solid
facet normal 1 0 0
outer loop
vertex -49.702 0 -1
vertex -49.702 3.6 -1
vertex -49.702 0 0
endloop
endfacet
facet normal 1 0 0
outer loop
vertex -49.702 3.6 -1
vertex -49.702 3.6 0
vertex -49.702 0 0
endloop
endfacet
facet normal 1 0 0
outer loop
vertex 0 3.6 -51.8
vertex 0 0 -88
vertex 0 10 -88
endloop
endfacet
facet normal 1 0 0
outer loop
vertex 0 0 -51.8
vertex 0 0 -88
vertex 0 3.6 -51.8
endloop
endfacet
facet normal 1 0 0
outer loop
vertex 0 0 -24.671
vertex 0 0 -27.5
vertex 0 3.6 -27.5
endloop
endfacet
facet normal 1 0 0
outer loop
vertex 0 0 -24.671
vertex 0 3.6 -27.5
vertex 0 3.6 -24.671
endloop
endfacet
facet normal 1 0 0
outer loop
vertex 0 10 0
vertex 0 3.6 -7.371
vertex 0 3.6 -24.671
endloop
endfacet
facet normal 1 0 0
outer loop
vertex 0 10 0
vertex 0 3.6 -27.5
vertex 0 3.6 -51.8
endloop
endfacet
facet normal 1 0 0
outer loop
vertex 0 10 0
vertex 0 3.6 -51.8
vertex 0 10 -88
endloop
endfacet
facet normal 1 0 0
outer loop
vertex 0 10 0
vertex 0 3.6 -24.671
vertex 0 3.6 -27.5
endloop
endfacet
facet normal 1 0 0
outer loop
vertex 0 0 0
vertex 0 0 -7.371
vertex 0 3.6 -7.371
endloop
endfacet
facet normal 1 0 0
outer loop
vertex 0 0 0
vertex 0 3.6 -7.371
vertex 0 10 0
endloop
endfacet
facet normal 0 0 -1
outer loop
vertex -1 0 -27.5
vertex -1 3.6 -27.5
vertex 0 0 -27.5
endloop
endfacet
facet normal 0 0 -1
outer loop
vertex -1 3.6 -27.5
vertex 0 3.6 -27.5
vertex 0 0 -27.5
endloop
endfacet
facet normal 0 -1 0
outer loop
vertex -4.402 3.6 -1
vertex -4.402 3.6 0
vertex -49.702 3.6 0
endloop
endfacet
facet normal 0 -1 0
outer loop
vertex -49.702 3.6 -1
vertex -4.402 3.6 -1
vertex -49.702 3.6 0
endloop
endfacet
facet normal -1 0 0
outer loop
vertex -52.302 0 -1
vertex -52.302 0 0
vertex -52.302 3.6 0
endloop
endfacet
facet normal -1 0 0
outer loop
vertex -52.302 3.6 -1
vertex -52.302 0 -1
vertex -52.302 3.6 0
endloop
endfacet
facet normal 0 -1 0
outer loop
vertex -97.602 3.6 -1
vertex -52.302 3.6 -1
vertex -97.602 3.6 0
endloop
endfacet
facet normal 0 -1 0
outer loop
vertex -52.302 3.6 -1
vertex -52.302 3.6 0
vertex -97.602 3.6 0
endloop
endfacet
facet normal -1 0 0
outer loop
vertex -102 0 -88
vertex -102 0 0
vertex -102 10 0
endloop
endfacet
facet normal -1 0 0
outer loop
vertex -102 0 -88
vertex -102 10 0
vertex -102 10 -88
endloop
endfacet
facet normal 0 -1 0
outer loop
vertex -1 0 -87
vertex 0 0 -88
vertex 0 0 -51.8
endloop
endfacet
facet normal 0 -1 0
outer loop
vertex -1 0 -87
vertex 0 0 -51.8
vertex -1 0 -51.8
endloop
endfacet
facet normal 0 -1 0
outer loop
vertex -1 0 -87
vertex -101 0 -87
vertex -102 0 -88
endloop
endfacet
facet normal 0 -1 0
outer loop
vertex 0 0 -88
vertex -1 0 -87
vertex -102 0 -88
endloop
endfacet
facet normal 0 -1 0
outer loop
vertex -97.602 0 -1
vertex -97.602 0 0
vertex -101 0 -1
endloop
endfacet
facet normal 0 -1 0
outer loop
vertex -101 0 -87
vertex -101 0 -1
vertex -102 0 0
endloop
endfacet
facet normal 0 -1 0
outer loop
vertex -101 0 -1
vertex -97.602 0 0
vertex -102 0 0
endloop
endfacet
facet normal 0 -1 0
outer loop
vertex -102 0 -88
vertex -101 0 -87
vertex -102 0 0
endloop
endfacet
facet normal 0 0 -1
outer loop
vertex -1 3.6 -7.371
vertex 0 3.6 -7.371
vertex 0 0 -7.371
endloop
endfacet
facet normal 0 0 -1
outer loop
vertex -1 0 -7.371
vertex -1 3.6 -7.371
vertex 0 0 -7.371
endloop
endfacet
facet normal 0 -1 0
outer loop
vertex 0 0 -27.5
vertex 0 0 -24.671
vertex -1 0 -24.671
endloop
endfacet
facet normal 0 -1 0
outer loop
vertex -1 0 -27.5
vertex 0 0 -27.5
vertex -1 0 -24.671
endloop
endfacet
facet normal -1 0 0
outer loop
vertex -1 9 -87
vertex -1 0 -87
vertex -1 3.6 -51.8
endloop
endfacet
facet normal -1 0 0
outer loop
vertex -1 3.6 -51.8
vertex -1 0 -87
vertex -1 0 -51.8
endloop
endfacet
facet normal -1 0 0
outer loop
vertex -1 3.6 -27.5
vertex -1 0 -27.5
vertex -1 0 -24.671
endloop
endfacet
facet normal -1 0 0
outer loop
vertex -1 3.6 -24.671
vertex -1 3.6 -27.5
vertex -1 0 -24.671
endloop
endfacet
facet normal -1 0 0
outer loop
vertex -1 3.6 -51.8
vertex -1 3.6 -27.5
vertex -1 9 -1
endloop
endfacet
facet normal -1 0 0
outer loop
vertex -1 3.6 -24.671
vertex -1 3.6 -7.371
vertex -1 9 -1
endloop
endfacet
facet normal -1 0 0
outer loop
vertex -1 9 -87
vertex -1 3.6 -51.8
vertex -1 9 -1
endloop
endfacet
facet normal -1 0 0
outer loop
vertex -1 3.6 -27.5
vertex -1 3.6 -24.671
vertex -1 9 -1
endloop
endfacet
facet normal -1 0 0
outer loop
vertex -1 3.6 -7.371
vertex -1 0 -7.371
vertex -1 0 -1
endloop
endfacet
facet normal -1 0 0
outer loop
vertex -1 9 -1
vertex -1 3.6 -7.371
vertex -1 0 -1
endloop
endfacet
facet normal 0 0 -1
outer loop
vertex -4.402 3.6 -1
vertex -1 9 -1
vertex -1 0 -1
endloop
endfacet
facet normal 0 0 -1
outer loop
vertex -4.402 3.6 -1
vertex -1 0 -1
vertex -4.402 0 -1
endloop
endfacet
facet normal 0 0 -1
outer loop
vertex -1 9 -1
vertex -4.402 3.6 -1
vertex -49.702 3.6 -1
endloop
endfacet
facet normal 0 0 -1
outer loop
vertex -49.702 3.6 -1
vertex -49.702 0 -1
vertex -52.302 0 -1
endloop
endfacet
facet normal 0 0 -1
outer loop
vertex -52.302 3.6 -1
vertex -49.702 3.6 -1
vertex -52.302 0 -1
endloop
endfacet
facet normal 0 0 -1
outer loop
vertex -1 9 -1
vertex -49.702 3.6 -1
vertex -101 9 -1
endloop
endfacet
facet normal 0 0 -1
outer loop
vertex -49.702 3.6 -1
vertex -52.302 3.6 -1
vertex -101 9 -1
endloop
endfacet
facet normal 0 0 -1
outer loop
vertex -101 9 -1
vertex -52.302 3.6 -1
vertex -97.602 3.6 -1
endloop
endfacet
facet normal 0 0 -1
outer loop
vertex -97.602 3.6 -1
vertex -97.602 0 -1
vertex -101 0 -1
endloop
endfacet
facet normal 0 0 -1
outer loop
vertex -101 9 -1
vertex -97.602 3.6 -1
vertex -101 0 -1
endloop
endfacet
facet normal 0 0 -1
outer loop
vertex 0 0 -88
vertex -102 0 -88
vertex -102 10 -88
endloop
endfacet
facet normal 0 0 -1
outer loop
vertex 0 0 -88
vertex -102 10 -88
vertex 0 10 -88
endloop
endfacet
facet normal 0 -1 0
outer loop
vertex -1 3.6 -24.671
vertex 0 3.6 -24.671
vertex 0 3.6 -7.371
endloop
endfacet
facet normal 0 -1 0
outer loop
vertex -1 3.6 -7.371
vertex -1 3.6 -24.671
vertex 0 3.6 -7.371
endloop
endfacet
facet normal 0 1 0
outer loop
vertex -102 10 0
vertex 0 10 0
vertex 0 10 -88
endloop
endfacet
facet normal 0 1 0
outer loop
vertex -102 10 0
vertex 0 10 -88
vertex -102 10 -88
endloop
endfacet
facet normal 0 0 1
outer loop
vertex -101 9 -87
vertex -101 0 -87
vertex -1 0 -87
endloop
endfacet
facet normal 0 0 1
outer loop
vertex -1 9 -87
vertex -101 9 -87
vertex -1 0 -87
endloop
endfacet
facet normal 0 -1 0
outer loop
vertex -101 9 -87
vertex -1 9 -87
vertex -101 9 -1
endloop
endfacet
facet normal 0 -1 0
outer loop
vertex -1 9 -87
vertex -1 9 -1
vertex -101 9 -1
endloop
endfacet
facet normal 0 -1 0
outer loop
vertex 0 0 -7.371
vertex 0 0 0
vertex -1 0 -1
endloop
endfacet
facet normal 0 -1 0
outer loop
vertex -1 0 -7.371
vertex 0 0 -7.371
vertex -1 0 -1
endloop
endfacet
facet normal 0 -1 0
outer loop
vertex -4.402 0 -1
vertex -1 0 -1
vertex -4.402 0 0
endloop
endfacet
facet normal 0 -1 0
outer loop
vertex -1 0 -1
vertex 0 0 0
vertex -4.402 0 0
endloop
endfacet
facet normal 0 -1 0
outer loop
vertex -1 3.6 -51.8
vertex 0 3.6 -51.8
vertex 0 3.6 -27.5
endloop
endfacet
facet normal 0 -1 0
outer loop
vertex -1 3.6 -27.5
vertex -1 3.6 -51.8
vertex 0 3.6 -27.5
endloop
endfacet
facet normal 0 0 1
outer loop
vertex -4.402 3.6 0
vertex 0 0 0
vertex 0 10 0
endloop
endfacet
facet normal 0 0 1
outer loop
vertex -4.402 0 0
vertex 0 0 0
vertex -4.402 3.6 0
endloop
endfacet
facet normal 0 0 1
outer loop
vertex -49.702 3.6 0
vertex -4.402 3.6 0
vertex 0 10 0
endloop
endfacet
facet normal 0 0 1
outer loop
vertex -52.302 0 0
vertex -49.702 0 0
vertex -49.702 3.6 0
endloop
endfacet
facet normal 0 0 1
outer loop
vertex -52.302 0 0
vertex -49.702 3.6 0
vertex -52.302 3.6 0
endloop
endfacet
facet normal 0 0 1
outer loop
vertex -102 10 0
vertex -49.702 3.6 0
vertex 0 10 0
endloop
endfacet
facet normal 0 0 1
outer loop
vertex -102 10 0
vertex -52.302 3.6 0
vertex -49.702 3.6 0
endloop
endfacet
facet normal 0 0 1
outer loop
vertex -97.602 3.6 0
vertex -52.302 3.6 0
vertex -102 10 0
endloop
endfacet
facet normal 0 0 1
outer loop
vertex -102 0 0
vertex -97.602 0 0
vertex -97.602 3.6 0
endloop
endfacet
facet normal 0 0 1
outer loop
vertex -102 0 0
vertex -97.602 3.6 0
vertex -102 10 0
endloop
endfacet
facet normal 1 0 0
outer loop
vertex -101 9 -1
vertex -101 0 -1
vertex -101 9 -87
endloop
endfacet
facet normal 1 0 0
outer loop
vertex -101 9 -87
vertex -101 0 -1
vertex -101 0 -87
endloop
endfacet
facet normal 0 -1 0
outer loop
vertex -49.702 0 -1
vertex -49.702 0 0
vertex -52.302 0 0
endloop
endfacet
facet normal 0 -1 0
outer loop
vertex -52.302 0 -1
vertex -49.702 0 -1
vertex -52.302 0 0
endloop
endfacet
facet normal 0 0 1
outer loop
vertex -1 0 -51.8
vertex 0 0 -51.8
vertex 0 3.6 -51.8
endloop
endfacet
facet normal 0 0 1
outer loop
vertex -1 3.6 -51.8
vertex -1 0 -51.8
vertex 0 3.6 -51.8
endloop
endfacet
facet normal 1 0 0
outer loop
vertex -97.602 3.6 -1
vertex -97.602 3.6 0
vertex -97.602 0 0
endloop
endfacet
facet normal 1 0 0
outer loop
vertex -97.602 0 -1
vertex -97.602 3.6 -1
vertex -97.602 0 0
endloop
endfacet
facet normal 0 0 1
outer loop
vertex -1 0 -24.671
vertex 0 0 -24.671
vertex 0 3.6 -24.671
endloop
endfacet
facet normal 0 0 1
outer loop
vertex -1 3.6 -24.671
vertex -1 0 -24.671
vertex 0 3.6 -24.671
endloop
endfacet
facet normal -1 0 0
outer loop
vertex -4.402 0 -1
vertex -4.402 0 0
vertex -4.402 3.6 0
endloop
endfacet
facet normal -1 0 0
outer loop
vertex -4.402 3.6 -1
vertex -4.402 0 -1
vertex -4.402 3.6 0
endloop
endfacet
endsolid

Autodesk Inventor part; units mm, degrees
ref_plane "YZ Plane" through (0, 0, 0) normal (1, 0, 0) x (0, 1, 0)
ref_plane "XZ Plane" through (0, 0, 0) normal (0, 1, 0) x (-1, 0, 0)
ref_plane "XY Plane" through (0, 0, 0) normal (0, 0, 1) x (1, 0, 0)
sketch "Sketch1" plane through (0, 0, 0) normal (0, 1, 0) x (-1, 0, 0)
  line L0 (0, 0) -> (102, 0)
  line L1 (102, 0) -> (102, -88)
  line L2 (102, -88) -> (0, -88)
  line L3 (0, -88) -> (0, 0)
  dimension "d0" = 102
  dimension "d1" = 88
extrude "Extrusion1" add sketch "Sketch1" along normal blind 10
shell "Shell1" thickness 1 removed faces 1 at (-68, 0, -29.3333)
sketch "Sketch2" plane through (-102, 0, 0) normal (0, 0, 1) x (1, 0, 0)
  line L0 (1, 0) -> (101, 0) projected
  line L1 (4.398, 0) -> (49.698, 0)
  line L2 (49.698, 0) -> (49.698, 3.6)
  line L3 (49.698, 3.6) -> (4.398, 3.6)
  line L4 (4.398, 3.6) -> (4.398, 0)
  line L5 (52.298, 0) -> (97.598, 0)
  line L6 (97.598, 0) -> (97.598, 3.6)
  line L7 (97.598, 3.6) -> (52.298, 3.6)
  line L8 (52.298, 3.6) -> (52.298, 0)
  line L9 (101, 0) -> (101, 9) projected
  point P0 (102, 0)
  point P1 (49.698, 0)
  dimension "d5" = 45.3
  dimension "d6" = 2.6
  dimension "d7" = 3.402
  dimension "d8" = 3.6
extrude "Extrusion2" cut sketch "Sketch2" against normal up to surface (1 mm away)
sketch "Sketch3" plane through (0, 0, 0) normal (1, 0, 0) x (0, 0, -1)
  line L0 (7.371, 0) -> (24.671, 0)
  line L1 (24.671, 0) -> (24.671, 3.6)
  line L2 (24.671, 3.6) -> (7.371, 3.6)
  line L3 (7.371, 3.6) -> (7.371, 0)
  line L4 (88, 0) -> (0, 0) projected
  line L5 (27.5, 0) -> (51.8, 0)
  line L6 (51.8, 0) -> (51.8, 3.6)
  line L7 (51.8, 3.6) -> (27.5, 3.6)
  line L8 (27.5, 3.6) -> (27.5, 0)
  line L9 (0, 3.6) -> (0, 0) projected
  line L10 (1, 0) -> (1, 9) projected
  dimension "d12" = 6.371
  dimension "d13" = 17.3
  dimension "d15" = 2.829
  dimension "d16" = 24.3
extrude "Extrusion3" cut sketch "Sketch3" against normal up to surface (1 mm away)
properties part number "TopCase"
